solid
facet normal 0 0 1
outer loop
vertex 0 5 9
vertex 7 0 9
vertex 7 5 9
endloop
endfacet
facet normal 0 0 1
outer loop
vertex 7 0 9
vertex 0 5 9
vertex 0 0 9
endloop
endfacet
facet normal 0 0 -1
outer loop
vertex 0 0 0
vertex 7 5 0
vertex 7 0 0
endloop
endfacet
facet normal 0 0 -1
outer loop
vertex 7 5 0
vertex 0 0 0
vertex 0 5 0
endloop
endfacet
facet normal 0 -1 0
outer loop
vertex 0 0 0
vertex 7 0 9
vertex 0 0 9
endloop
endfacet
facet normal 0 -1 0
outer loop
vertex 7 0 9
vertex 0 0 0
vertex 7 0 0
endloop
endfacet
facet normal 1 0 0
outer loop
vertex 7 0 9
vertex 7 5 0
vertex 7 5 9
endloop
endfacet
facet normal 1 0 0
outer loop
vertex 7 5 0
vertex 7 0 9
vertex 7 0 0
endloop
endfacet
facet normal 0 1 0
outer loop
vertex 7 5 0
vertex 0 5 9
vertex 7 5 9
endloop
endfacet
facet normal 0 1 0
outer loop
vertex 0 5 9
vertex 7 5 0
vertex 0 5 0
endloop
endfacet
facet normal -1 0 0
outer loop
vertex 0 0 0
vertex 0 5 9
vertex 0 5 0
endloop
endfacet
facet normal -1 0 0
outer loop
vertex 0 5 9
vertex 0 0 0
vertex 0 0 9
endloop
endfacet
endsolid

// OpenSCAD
// Generated by SolidPython 1.0.1 on 2020-07-29 00:46:55


cube(size = [7, 5, 9]);
/***********************************************
*********      SolidPython code:      **********
************************************************
 
# import packages: SolidPython
from solid import *
from solid.utils import *
from itertools import chain, combinations, permutations


class Resize:

    def __init__(self, scad_file):
        self.scad_file = scad_file
        #self.scad_file = import_scad(scad_file)
        # cone/cylinder param:
        self.r1 = 0
        self.r2 = 0
        self.h = 0
        # rectangular prism param:
        self.w = 0
        self.l = 0
        # ellipse param:
        self.r = 0

    # import OpenScad code (file name corresponds to shape)


    # classify shape + parameters
    def assign(self, param1, param2, param3):
        if self.scad_file == 'cone.scad':
            self.r1 = param1
            self.r2 = param2
            self.h = param3
        elif self.scad_file == 'cylinder.scad':
            self.r1 = param1
            self.r2 = param2
            self.h = param3
        elif self.scad_file == 'rectangularPrism.scad':
            self.h = param1
            self.l = param2
            self.w = param3
        else:
            self.r = param1
            self.h = param2

    # resize parameters
    def iterate(self):
        x = range(3, 20, 2)
        i = 1
        if self.scad_file == 'cone.scad':
            tempList = list(permutations(x, 2))
            for temp in tempList:
                param1 = temp[0]
                param2 = temp[1]
                filepath = 'produced_scad_files/' + 'cone' + str(param1) + '_' + str(param2) + '_' + '.scad'
                scad_render_to_file(cylinder(h=param1, r1=param2, r2=0), filepath)

        elif self.scad_file == 'cylinder.scad':
            tempList = list(permutations(x, 3))
            for temp in tempList:
                param1 = temp[0]
                param2 = temp[1]
                filepath = 'produced_scad_files/' + 'cylinder' + str(param1) + '_' + str(param2) + '_' + '.scad'
                scad_render_to_file(cylinder(h=param1, r1=param2, r2=param2), filepath)

        elif self.scad_file == 'rectangularPrism.scad':
            tempList = list(permutations(x, 3))
            for temp in tempList:
                param1 = temp[0]
                param2 = temp[1]
                param3 = temp[2]
                filepath = 'produced_scad_files/' + 'rectangularPrism' + str(param1) + '_' + str(param2) + '_' + str(
                    param3) + '.scad'
                scad_render_to_file(cube(size=(param1, param2, param3)), filepath)

        elif self.scad_file == 'ellipse.scad':
            tempList = list(permutations(x, 4))
            for temp in tempList:
                param1 = temp[0]
                param2 = temp[1]
                param3 = temp[2]
                param4 = temp[3]
                filepath = 'produced_scad_files/' + 'ellipse' + str(param1) + '_' + str(param2) + '_' + str(param3) + '_' + str(param4) + '.scad'
                scad_render_to_file(scale([param1, param2, param3])(sphere(r=param4)), filepath)

    def render_to_scadfile(self):
        scad_render_to_file(scad, 'example.scad') 
 
************************************************/
